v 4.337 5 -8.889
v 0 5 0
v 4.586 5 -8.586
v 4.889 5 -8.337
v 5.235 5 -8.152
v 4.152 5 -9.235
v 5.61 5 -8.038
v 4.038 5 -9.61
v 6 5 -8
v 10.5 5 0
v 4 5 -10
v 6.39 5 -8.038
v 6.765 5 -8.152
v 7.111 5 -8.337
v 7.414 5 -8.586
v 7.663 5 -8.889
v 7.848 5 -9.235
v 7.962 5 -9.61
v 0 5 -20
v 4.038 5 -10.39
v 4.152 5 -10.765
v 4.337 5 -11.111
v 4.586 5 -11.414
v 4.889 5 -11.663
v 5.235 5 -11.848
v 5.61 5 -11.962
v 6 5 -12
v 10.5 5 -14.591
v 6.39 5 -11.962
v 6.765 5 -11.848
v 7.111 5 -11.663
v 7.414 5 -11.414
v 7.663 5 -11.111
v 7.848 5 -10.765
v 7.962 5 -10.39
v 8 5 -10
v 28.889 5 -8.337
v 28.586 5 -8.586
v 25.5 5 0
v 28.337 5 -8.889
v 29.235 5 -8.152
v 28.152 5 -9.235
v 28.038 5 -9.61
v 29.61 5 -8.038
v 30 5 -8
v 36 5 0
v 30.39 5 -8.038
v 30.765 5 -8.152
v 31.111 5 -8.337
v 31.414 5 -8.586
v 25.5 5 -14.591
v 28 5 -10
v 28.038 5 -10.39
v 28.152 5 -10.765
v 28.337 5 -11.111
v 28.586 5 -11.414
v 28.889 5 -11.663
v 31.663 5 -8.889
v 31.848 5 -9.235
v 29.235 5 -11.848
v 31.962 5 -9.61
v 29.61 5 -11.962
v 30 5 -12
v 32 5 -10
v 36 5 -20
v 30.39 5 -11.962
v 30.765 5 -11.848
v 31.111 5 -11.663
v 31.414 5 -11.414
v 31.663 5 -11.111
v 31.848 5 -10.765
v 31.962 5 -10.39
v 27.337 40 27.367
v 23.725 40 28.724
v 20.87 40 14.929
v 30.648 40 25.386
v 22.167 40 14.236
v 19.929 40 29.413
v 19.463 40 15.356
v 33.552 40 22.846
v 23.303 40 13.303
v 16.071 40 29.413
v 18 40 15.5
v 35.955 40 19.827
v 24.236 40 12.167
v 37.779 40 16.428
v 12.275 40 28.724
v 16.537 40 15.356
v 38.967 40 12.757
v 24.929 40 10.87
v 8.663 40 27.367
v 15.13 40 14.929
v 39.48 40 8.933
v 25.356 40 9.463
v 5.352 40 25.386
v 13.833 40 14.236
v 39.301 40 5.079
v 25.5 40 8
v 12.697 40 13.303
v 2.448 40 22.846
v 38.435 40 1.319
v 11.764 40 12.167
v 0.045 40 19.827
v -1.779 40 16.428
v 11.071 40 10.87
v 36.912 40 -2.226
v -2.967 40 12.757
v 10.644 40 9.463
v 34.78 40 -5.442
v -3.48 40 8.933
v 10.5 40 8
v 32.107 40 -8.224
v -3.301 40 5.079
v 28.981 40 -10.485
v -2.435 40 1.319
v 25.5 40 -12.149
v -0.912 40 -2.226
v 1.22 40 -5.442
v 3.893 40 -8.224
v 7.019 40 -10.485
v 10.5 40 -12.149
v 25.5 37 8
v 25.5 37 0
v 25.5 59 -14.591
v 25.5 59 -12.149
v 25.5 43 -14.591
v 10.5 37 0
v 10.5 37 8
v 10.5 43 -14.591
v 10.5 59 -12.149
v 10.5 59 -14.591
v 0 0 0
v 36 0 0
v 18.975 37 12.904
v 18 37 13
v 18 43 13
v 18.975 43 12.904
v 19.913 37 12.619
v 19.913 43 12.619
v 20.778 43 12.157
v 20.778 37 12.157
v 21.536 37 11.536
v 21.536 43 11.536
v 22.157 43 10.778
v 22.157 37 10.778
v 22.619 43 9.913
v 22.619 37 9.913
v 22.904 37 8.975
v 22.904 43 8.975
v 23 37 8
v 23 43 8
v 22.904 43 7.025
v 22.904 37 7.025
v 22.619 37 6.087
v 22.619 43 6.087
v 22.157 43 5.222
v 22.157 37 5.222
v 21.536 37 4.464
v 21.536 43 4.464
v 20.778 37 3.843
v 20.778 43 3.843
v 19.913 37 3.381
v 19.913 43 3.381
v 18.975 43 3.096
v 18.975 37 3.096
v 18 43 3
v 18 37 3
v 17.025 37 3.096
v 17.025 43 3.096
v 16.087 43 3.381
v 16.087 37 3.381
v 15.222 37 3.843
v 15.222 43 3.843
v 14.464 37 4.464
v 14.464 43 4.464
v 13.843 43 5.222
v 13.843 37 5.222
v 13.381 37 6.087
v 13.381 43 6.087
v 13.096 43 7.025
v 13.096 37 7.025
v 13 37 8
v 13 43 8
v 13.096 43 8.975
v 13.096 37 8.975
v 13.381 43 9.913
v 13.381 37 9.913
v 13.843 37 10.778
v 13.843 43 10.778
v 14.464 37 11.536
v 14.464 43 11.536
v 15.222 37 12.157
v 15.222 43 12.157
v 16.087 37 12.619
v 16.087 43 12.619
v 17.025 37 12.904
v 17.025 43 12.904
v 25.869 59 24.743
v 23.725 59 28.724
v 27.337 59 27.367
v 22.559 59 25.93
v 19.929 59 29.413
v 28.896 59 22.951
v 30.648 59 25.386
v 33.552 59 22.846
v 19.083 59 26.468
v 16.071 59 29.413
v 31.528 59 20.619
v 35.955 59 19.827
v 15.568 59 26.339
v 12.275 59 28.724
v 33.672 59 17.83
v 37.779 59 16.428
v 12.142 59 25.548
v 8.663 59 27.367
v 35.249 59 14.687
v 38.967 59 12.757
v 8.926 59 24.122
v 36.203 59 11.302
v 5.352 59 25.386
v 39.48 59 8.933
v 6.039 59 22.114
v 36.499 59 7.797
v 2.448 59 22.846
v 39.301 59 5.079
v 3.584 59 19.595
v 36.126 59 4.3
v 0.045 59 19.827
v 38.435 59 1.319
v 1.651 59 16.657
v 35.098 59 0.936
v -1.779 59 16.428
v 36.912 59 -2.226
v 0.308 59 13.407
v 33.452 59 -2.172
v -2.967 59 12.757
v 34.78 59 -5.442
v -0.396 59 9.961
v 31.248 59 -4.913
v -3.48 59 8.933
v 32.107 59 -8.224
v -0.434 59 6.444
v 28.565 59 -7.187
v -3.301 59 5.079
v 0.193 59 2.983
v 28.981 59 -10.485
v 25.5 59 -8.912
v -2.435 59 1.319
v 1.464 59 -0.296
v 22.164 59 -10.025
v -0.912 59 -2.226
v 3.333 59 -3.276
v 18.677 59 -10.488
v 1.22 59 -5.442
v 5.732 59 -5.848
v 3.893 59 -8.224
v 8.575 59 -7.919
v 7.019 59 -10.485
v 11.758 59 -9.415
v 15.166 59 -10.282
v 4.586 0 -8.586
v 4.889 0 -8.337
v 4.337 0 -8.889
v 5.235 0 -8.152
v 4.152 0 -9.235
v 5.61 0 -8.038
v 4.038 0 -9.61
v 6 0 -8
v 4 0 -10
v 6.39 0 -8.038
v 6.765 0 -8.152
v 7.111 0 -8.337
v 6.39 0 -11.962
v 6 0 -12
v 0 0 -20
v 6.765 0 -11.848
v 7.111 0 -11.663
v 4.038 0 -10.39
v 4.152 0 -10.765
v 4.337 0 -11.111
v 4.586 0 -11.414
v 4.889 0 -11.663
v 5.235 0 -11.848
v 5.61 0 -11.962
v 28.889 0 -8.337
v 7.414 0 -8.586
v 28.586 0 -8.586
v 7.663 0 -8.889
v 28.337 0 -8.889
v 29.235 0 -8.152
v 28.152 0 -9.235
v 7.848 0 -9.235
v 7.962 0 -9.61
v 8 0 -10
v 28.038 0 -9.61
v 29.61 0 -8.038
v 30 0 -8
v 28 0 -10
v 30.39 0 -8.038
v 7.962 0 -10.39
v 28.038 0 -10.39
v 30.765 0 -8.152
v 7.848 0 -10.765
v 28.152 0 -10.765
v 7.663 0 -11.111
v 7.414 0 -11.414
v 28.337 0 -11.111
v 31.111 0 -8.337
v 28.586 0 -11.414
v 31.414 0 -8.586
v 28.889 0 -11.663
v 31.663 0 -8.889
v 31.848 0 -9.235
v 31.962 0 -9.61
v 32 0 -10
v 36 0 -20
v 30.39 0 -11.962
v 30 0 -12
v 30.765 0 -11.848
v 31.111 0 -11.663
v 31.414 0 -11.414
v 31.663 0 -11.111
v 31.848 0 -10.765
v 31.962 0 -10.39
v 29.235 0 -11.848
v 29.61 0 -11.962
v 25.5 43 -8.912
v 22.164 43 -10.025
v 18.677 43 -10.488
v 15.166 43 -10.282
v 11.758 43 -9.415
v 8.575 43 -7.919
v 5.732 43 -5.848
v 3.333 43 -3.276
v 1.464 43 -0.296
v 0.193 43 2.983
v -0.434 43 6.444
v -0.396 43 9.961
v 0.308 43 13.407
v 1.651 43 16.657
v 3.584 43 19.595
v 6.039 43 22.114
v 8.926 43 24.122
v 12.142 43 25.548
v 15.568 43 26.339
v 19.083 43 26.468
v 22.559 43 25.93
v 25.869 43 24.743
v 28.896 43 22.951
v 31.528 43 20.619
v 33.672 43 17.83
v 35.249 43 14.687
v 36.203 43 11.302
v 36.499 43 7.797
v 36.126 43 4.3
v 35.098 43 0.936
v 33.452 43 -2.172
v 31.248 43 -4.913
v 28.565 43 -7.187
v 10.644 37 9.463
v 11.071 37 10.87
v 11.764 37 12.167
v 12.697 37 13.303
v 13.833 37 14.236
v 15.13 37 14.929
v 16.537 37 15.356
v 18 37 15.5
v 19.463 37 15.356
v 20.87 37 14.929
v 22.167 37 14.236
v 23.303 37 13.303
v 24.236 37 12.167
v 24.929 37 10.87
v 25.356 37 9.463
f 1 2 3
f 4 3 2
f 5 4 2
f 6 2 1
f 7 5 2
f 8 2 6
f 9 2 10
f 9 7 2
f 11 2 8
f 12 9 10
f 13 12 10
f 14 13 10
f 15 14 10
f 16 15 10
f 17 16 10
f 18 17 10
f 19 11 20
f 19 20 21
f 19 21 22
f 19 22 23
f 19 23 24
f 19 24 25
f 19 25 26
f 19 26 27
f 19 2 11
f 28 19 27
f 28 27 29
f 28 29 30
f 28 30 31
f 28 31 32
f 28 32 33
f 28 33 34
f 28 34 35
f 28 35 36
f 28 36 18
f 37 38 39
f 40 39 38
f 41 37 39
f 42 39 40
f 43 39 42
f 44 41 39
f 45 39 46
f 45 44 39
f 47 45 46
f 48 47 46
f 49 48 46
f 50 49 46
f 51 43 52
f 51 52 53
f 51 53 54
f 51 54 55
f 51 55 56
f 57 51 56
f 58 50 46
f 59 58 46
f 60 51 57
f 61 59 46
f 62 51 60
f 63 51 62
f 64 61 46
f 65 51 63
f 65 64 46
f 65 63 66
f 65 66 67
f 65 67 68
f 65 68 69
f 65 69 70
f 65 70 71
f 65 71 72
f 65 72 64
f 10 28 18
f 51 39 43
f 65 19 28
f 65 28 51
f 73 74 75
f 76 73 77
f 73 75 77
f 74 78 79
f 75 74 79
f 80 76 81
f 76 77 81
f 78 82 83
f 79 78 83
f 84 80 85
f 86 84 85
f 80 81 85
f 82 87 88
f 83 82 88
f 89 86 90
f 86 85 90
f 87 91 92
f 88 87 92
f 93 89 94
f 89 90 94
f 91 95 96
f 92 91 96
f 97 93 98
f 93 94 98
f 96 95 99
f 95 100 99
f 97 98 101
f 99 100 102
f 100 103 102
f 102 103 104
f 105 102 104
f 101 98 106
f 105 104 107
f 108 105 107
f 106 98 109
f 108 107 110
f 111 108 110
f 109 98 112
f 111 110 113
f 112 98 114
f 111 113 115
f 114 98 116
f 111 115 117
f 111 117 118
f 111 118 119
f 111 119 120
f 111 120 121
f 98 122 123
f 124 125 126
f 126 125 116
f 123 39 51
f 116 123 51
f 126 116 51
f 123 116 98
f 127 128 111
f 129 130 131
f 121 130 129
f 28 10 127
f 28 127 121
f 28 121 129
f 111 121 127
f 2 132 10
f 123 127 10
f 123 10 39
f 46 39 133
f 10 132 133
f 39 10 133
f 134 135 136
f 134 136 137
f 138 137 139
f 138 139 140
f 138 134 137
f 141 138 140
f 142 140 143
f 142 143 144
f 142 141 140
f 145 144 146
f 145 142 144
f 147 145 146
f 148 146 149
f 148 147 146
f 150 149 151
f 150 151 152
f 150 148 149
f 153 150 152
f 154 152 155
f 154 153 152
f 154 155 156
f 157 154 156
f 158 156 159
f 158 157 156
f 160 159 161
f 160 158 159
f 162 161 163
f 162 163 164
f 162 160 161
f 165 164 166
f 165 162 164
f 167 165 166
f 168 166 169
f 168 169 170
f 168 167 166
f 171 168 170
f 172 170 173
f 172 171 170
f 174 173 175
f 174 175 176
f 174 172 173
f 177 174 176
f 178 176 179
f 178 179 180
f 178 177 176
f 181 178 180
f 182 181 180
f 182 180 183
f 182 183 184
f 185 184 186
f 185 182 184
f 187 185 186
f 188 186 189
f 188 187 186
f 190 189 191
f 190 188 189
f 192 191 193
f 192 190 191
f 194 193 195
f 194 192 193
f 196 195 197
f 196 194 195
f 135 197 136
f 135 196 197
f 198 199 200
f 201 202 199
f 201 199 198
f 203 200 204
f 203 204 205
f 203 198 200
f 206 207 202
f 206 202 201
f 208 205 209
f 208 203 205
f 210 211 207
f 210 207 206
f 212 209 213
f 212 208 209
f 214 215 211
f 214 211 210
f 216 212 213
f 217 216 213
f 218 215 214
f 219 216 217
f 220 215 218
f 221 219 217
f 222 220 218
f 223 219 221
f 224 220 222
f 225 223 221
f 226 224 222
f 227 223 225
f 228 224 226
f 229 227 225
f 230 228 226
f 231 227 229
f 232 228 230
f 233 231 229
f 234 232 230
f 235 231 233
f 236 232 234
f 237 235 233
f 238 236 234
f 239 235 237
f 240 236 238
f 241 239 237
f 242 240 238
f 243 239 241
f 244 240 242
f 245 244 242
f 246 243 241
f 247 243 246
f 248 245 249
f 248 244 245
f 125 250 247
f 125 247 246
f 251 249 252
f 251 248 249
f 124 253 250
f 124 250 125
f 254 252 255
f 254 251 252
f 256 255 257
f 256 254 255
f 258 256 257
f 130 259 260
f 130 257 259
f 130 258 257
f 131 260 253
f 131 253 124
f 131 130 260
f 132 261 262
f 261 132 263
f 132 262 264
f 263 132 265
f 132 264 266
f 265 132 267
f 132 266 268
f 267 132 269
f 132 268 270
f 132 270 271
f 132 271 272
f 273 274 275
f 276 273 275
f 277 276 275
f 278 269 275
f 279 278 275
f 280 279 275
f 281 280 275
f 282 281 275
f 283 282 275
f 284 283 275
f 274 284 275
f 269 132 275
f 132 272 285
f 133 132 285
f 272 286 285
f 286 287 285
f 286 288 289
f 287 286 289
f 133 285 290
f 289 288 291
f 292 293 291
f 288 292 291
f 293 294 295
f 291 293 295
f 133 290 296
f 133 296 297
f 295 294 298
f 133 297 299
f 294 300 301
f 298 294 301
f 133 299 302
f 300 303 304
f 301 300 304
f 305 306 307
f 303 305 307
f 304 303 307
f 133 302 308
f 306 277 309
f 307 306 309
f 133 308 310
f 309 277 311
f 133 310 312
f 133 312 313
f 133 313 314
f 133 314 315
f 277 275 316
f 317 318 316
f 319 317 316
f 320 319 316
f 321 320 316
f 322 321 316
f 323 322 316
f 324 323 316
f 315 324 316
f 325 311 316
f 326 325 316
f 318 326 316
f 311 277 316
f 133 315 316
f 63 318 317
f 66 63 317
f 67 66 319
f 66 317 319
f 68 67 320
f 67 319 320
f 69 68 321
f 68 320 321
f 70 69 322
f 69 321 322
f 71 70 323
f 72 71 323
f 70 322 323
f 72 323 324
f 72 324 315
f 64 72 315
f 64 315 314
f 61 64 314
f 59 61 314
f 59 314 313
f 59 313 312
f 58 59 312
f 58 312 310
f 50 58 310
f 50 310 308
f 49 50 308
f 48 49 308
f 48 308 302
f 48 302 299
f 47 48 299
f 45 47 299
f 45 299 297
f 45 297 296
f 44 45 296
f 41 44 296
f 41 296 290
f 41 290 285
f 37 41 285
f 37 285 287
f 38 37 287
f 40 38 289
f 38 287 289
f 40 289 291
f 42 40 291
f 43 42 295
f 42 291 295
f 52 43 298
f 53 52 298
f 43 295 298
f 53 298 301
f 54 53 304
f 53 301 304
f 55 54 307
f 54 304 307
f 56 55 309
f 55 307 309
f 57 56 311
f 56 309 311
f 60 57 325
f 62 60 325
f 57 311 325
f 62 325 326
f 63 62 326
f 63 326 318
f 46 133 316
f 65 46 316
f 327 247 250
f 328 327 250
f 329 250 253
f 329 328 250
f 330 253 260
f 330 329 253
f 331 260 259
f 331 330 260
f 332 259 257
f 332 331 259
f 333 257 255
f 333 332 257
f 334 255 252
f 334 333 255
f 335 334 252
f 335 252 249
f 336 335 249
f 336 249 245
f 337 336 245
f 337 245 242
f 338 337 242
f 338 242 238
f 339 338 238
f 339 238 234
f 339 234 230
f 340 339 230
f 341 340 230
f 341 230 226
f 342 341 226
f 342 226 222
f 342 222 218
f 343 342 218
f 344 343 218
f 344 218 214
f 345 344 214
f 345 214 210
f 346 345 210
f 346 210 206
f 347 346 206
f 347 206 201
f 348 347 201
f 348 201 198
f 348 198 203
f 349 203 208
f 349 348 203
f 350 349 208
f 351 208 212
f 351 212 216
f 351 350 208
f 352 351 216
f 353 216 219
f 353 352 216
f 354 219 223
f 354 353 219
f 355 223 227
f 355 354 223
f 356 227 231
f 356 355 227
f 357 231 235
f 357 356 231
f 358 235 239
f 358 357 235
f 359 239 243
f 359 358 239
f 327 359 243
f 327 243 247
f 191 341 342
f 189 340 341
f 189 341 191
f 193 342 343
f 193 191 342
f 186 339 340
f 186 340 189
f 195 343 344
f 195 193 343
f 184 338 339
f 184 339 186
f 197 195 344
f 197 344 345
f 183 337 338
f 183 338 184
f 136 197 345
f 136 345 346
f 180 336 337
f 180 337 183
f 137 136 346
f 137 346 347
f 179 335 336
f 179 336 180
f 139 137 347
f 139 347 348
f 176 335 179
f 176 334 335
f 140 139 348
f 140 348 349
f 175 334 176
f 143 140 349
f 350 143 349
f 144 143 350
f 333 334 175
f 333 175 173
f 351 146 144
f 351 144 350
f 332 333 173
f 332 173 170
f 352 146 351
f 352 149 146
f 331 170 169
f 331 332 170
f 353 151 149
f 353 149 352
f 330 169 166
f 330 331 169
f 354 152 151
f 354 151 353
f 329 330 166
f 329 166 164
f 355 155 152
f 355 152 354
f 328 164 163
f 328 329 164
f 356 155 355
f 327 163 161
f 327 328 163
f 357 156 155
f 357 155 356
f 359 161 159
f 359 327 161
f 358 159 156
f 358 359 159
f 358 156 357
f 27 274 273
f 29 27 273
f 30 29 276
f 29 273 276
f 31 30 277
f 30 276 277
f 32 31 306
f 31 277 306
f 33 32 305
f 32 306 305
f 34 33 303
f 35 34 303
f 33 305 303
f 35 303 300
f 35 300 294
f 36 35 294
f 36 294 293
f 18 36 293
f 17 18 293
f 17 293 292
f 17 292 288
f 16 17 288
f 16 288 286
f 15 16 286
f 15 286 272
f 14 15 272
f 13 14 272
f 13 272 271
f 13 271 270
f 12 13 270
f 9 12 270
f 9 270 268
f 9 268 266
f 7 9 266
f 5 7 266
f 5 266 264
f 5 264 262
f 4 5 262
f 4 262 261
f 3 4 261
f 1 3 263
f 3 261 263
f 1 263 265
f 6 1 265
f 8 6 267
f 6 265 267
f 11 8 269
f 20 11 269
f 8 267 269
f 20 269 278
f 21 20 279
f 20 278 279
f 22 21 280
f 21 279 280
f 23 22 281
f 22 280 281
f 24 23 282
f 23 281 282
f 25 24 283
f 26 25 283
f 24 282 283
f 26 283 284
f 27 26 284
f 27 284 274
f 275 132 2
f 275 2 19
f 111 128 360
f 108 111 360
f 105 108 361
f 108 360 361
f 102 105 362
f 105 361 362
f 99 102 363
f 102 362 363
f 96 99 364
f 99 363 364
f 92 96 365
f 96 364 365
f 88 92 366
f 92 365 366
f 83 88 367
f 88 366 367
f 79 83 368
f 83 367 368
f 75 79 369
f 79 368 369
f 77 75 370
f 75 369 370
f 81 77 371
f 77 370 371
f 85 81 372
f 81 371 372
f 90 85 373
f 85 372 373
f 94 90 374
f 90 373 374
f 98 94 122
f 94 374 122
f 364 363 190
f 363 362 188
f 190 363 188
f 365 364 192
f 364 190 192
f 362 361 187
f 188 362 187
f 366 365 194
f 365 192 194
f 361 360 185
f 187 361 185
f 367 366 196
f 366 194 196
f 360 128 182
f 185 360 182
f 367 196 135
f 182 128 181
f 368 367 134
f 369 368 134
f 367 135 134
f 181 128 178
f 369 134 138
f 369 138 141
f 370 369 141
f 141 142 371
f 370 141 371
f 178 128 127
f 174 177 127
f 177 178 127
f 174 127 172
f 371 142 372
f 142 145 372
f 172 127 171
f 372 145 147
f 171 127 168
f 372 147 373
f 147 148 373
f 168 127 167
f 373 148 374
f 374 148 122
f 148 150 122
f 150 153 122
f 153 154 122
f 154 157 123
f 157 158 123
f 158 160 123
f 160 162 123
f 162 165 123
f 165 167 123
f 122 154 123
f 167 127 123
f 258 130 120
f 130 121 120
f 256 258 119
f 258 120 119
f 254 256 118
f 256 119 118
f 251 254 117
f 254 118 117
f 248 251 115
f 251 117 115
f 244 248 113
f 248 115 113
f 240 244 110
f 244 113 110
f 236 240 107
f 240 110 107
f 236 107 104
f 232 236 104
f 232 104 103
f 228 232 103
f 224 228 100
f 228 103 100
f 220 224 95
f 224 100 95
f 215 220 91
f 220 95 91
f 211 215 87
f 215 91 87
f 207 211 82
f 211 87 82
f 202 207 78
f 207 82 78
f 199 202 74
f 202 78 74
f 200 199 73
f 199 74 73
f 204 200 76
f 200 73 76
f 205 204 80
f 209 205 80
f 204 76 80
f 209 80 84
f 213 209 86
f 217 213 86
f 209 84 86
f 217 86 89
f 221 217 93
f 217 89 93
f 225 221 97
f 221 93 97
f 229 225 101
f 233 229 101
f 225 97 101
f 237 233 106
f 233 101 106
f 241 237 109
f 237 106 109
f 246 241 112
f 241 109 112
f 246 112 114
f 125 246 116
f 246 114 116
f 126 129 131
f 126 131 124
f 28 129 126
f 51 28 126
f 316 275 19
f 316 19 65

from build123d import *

# Parameters (mm, degrees)
ESQUISSE1_W             = 36
ESQUISSE1_H             = 20
BOSS_EXTRU_1_DEPTH      = 5
ESQUISSE2_W             = 15
ESQUISSE2_H             = 10.591208458
ESQUISSE2_H_2           = 4
BOSS_EXTRU_2_DEPTH      = 32
ESQUISSE3_R             = 5
BOSS_EXTRU_3_DEPTH      = 6
ESQUISSE4_R             = 21.5
ESQUISSE4_R_2           = 18.5
BOSS_EXTRU_4_DEPTH      = 16
BOSS_EXTRU_5_START      = -3
ESQUISSE5_R             = 21.5
ESQUISSE5_R_2           = 7.5
BOSS_EXTRU_5_DEPTH      = 3
ESQUISSE6_W             = 15
ESQUISSE6_H             = 3.413220749
BOSS_EXTRU_6_DEPTH      = 16
ESQUISSE8_R             = 2
ENL_V_MAT_EXTRU_1_DEPTH = 16


with BuildPart() as part:
    # Esquisse1 → Boss.-Extru.1 (new body)
    with BuildSketch(Plane(origin=(0, 0, 0), x_dir=(1, 0, 0), z_dir=(0, 1, 0))):
        with Locations((18, 10)):
            Rectangle(ESQUISSE1_W, ESQUISSE1_H)
    extrude(amount=BOSS_EXTRU_1_DEPTH)

    # Esquisse2 → Boss.-Extru.2 (add)
    with BuildSketch(Plane(origin=(0, 5, 0), x_dir=(1, 0, 0), z_dir=(0, 1, 0))):
        with Locations((18, 5.295604229)):
            Rectangle(ESQUISSE2_W, ESQUISSE2_H)
        with Locations((18, 12.591208458)):
            Rectangle(ESQUISSE2_W, ESQUISSE2_H_2)
    extrude(amount=BOSS_EXTRU_2_DEPTH)

    # Esquisse3 → Boss.-Extru.3 (add)
    with BuildSketch(Plane(origin=(0, 37, 0), x_dir=(1, 0, 0), z_dir=(0, 1, 0))):
        with BuildLine():
            Line((10.5, 14.591208458), (10.5, -8))
            ThreePointArc((10.5, -8), (18, -15.5), (25.5, -8))
            Line((25.5, -8), (25.5, 14.591208458))
            Line((25.5, 14.591208458), (10.5, 14.591208458))
        make_face()
        with Locations(Location((18, -8, 0), (0, 0, 270))):
            Circle(ESQUISSE3_R, mode=Mode.SUBTRACT)
    extrude(amount=BOSS_EXTRU_3_DEPTH)

    # Esquisse4 → Boss.-Extru.4 (add)
    with BuildSketch(Plane(origin=(0, 43, 0), x_dir=(1, 0, 0), z_dir=(0, 1, 0))):
        with Locations(Location((18, -8, 0), (0, 0, 69.583789871))):
            Circle(ESQUISSE4_R)
        with Locations(Location((18, -8, 0), (0, 0, 66.083465578))):
            Circle(ESQUISSE4_R_2, mode=Mode.SUBTRACT)
    extrude(amount=BOSS_EXTRU_4_DEPTH)

    # Esquisse5 → Boss.-Extru.5 (add)
    with BuildSketch(Plane(origin=(0, 43, 0), x_dir=(1, 0, 0), z_dir=(0, 1, 0)).offset(BOSS_EXTRU_5_START)):
        with Locations(Location((18, -8, 0), (0, 0, 69.583789871))):
            Circle(ESQUISSE5_R)
        with Locations((18, -8)):
            Circle(ESQUISSE5_R_2, mode=Mode.SUBTRACT)
    extrude(amount=BOSS_EXTRU_5_DEPTH)

    # Esquisse6 → Boss.-Extru.6 (add)
    with BuildSketch(Plane(origin=(0, 43, 0), x_dir=(1, 0, 0), z_dir=(0, 1, 0))):
        with Locations((18, 12.884598084)):
            Rectangle(ESQUISSE6_W, ESQUISSE6_H)
    extrude(amount=BOSS_EXTRU_6_DEPTH)

    # Esquisse8 → Enlèv. mat.-Extru.1 (cut)
    with BuildSketch(Plane.XZ):
        with Locations(Location((6, -10, 0), (0, 0, 270))):
            Circle(ESQUISSE8_R)
        with Locations(Location((30, -10, 0), (0, 0, 270))):
            Circle(ESQUISSE8_R)
    extrude(amount=-ENL_V_MAT_EXTRU_1_DEPTH, mode=Mode.SUBTRACT)


solid = part.part
